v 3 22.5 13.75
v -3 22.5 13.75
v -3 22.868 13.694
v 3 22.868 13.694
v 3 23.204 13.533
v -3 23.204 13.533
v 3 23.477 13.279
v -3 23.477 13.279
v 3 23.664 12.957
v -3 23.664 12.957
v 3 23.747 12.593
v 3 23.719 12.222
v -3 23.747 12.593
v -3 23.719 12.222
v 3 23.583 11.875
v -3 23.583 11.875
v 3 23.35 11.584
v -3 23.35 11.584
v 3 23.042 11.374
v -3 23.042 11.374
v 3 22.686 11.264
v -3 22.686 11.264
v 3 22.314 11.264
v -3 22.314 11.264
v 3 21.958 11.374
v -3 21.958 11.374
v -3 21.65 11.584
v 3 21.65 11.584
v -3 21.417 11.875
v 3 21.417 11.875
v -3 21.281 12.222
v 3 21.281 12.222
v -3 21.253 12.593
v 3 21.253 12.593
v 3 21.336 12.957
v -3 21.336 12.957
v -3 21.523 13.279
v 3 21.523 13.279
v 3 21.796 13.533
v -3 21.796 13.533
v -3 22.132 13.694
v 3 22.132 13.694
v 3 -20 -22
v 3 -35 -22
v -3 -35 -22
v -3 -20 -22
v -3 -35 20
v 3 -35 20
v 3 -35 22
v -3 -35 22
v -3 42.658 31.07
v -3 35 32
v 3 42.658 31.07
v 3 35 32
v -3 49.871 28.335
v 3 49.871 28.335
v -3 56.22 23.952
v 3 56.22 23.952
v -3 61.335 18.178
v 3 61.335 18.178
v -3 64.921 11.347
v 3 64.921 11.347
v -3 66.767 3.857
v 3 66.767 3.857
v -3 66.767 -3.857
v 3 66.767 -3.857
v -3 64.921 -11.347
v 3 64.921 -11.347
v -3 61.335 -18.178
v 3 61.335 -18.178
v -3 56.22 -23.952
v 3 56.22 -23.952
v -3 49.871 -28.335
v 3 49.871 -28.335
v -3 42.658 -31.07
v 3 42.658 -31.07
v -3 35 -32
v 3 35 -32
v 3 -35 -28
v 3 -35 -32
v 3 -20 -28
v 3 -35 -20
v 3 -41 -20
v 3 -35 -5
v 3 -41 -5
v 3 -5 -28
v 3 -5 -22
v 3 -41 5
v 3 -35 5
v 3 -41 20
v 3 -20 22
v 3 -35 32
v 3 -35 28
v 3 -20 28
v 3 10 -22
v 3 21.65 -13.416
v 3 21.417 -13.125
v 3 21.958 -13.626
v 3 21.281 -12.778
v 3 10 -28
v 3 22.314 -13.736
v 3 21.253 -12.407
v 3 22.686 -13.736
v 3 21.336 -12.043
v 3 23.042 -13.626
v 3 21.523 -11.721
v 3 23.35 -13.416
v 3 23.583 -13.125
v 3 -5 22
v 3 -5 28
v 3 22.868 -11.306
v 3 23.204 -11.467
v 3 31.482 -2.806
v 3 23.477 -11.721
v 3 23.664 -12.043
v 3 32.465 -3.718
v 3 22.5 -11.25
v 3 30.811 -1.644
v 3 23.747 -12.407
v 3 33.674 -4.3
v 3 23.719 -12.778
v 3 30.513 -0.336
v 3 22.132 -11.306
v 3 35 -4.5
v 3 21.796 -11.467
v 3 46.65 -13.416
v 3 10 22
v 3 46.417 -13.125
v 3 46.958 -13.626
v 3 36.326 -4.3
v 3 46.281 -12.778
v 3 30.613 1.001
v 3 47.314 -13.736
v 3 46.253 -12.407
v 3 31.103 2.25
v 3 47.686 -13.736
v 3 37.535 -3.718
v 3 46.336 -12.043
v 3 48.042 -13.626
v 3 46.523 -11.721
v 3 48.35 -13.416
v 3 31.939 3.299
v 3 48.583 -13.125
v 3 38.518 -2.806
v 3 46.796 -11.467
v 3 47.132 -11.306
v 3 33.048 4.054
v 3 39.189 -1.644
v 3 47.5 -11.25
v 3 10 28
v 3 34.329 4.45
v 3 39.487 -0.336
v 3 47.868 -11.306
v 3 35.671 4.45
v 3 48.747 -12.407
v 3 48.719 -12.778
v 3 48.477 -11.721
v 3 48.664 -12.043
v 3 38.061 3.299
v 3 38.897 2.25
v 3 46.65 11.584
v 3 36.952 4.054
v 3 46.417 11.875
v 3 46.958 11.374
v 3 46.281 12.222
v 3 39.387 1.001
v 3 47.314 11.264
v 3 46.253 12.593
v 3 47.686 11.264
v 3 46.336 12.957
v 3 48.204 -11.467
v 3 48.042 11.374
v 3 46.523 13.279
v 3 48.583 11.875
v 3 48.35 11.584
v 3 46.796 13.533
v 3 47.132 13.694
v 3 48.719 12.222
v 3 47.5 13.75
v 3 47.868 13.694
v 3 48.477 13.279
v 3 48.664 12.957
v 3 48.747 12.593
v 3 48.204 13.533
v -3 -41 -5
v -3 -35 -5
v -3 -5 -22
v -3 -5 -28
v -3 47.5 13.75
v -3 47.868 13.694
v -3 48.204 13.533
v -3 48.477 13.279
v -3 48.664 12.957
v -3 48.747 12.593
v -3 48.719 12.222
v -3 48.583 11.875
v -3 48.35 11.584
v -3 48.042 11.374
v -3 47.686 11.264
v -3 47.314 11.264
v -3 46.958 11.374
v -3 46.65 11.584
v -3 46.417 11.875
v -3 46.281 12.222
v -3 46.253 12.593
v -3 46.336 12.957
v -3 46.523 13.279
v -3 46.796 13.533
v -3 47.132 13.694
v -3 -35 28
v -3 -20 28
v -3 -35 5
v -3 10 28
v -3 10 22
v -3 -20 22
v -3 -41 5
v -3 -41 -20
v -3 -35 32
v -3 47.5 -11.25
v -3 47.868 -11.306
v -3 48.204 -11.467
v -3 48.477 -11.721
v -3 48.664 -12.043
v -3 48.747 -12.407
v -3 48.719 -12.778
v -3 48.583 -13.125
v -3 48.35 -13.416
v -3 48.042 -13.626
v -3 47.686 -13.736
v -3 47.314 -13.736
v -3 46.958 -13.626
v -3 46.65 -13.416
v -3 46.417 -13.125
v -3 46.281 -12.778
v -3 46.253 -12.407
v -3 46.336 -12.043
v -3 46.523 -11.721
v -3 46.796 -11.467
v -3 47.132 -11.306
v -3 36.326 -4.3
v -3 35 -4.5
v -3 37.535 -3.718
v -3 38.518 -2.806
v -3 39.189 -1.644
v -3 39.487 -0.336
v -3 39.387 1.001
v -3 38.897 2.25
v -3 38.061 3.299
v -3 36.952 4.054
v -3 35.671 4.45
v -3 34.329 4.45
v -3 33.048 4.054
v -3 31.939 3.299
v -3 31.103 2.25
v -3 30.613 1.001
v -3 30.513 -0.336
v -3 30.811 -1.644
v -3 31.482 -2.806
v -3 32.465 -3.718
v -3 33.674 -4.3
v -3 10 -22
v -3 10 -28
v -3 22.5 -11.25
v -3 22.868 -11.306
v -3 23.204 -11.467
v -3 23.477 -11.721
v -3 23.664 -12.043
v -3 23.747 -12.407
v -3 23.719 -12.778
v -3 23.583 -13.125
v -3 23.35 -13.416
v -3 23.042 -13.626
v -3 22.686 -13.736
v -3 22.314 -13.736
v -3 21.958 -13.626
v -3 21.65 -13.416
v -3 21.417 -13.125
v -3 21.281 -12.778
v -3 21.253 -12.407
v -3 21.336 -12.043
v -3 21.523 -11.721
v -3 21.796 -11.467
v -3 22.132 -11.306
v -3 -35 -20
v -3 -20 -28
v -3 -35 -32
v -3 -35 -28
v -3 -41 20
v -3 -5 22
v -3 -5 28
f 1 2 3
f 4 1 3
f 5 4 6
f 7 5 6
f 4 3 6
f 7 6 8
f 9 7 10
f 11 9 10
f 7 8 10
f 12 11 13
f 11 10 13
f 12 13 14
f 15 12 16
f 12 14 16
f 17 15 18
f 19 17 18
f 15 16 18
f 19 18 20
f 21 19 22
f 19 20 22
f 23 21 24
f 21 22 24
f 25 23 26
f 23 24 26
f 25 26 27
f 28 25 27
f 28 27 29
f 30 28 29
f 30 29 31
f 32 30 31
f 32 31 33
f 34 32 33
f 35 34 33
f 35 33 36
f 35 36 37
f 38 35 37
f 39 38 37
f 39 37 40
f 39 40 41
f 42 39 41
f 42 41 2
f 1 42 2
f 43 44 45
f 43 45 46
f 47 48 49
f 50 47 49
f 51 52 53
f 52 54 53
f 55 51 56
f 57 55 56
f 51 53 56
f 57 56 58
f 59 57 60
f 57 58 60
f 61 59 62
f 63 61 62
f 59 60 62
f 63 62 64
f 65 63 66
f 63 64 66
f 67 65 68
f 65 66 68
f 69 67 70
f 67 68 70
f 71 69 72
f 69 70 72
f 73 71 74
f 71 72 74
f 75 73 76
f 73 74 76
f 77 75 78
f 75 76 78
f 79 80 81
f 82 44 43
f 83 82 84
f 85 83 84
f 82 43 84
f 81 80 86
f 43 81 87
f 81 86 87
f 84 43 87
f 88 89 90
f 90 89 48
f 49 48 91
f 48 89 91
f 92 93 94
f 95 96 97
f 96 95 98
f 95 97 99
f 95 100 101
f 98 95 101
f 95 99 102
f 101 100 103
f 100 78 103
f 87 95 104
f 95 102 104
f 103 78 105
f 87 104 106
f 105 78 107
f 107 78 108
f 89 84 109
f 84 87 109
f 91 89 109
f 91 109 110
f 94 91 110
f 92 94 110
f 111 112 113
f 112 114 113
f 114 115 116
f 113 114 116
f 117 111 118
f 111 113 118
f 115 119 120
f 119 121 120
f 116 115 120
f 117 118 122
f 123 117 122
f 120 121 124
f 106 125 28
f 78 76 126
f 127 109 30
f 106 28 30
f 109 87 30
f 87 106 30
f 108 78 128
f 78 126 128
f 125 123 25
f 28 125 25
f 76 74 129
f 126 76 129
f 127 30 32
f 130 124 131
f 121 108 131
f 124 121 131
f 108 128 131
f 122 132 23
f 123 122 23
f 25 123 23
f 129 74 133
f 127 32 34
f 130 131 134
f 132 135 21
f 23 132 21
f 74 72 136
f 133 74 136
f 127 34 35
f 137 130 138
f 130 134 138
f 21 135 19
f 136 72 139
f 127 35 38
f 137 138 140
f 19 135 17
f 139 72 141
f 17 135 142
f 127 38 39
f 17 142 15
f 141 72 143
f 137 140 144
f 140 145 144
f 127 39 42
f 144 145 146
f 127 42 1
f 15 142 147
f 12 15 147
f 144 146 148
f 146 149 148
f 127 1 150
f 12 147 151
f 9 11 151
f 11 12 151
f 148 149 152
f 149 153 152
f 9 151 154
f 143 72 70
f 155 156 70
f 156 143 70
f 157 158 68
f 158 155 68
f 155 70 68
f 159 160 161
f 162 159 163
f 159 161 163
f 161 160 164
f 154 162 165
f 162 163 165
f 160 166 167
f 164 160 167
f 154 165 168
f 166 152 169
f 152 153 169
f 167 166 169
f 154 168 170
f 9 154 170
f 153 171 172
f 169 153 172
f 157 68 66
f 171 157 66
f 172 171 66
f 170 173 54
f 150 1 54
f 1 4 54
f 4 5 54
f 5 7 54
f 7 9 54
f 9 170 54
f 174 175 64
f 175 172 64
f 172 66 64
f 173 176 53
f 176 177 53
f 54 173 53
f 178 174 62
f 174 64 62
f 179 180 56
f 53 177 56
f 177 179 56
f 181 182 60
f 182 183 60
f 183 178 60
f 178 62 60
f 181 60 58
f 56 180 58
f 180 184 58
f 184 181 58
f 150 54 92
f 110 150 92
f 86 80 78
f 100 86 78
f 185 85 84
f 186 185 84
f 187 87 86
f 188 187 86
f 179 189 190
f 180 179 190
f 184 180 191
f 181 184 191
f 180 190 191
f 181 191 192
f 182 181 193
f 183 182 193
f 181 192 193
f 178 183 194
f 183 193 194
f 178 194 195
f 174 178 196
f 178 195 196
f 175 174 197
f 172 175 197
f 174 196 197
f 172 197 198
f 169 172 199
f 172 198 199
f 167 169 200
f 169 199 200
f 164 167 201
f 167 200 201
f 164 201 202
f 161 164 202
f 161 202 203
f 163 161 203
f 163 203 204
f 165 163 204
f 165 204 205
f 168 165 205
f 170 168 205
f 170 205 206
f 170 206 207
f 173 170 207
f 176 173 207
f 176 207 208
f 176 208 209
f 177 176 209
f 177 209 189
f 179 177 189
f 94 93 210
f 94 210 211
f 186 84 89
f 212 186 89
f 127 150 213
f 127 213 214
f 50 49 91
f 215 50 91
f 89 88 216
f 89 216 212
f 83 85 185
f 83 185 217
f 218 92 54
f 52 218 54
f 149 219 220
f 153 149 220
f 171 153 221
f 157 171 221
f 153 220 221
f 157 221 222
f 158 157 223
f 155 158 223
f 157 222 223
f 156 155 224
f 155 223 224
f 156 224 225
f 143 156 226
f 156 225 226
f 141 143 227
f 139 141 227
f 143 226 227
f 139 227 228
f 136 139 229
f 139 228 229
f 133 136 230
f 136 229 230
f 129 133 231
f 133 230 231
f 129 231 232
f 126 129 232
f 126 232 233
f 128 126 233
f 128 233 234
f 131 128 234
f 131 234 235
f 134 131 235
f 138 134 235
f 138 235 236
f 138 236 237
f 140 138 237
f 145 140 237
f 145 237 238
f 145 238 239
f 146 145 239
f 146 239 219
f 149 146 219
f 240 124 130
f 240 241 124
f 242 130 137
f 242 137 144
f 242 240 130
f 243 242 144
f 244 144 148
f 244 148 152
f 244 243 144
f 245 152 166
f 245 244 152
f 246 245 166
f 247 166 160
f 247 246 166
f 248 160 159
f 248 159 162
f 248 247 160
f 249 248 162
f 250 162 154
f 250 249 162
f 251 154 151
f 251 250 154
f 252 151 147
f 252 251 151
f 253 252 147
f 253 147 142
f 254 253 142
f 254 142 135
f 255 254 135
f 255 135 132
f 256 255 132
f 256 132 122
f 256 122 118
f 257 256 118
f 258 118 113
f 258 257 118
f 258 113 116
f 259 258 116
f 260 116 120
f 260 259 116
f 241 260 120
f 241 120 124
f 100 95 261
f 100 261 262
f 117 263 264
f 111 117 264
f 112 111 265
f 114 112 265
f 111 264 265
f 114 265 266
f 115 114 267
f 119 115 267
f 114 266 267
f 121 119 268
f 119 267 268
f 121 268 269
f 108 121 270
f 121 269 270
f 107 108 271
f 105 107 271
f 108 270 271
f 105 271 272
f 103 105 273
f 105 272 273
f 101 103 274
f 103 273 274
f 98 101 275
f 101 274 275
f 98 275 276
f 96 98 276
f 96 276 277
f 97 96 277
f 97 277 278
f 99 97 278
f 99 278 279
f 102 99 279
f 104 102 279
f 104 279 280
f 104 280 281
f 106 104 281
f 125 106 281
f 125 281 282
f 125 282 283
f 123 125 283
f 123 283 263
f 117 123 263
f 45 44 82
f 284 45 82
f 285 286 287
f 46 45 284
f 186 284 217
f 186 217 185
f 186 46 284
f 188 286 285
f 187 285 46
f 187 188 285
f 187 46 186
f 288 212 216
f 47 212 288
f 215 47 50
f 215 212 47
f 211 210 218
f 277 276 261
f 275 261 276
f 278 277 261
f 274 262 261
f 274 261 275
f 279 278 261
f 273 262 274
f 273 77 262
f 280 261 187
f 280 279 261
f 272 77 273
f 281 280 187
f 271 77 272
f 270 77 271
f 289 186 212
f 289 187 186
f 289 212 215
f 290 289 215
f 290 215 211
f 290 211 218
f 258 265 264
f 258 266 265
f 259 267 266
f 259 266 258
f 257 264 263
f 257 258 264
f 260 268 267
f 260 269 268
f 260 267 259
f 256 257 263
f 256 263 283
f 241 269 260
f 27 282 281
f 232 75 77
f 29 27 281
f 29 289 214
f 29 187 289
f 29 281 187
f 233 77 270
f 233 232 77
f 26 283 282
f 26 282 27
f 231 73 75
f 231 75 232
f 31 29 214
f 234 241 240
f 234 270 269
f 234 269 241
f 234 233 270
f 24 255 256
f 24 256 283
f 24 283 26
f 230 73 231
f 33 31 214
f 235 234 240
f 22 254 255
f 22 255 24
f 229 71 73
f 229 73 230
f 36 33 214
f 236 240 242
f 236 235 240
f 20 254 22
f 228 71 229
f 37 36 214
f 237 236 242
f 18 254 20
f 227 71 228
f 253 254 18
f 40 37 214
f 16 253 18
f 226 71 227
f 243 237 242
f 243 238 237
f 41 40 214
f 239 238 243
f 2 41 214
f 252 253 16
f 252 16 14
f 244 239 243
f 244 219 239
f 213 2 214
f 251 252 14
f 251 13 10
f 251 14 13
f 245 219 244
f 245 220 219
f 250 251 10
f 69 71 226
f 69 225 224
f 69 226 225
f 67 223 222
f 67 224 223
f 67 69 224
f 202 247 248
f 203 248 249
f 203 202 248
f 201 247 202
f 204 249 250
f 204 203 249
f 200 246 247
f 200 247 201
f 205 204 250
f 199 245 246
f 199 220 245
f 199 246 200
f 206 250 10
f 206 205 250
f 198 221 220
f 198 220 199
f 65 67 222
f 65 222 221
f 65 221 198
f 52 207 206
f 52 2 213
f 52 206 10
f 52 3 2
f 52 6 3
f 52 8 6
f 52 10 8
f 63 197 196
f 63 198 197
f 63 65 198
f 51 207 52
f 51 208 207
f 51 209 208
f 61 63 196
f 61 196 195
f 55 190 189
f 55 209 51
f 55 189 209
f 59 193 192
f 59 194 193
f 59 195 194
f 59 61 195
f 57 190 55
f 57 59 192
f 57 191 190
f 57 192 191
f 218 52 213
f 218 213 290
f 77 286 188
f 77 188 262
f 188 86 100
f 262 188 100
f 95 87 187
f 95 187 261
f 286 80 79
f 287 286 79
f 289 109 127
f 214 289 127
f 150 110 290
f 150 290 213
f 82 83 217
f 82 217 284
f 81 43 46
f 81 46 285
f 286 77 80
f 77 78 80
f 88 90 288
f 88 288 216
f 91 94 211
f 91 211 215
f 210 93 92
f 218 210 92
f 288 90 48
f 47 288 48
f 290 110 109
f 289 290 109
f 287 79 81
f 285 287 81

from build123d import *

# Parameters (mm, degrees)
CROQUIS1_R                = 4.5
SALIENTE_EXTRUIR1_DEPTH   = 3
TALADRO_ROSCADO_M3X0_51_D = 2.5
CROQUIS6_W                = 6
CROQUIS6_H                = 15
CORTAR_EXTRUIR1_DEPTH     = 75.491610266
CROQUIS7_W                = 15
CROQUIS7_H                = 6
SALIENTE_EXTRUIR3_DEPTH   = 6


with BuildPart() as part:
    # Croquis1 → Saliente-Extruir1 (new, symmetric)
    with BuildSketch(Plane(origin=(0, 0, 0), x_dir=(0, 0, -1), z_dir=(1, 0, 0))):
        with BuildLine():
            Line((-32, -35), (-32, 35))
            ThreePointArc((-32, 35), (0, 67), (32, 35))
            Line((32, 35), (32, -35))
            Line((32, -35), (-32, -35))
        make_face()
        with Locations((0, 35)):
            Circle(CROQUIS1_R, mode=Mode.SUBTRACT)
    extrude(amount=SALIENTE_EXTRUIR1_DEPTH, both=True)

    # Taladro roscado M3x0.51 (through all)
    with Locations(Plane(origin=(3, 0, 0), x_dir=(0, 0, -1), z_dir=(1, 0, 0))):
        with Locations((12.5, 47.5), (12.5, 22.5), (-12.5, 22.5), (-12.5, 47.5)):
            Hole(TALADRO_ROSCADO_M3X0_51_D / 2)

    # Croquis6 → Cortar-Extruir1 (cut, through all)
    with BuildSketch(Plane(origin=(3, 0, 0), x_dir=(0, 0, -1), z_dir=(1, 0, 0))):
        with Locations((-25, 2.5)):
            Rectangle(CROQUIS6_W, CROQUIS6_H)
        with Locations((-25, -27.5)):
            Rectangle(CROQUIS6_W, CROQUIS6_H)
        with Locations((25, -27.5)):
            Rectangle(CROQUIS6_W, CROQUIS6_H)
        with Locations((25, 2.5)):
            Rectangle(CROQUIS6_W, CROQUIS6_H)
    extrude(amount=-CORTAR_EXTRUIR1_DEPTH, mode=Mode.SUBTRACT)

    # Croquis7 → Saliente-Extruir3 (add, through all)
    with BuildSketch(Plane(origin=(3, 0, 0), x_dir=(0, 0, -1), z_dir=(1, 0, 0))):
        with Locations((-12.5, -38)):
            Rectangle(CROQUIS7_W, CROQUIS7_H)
        with Locations((12.5, -38)):
            Rectangle(CROQUIS7_W, CROQUIS7_H)
    extrude(amount=-SALIENTE_EXTRUIR3_DEPTH)


solid = part.part
